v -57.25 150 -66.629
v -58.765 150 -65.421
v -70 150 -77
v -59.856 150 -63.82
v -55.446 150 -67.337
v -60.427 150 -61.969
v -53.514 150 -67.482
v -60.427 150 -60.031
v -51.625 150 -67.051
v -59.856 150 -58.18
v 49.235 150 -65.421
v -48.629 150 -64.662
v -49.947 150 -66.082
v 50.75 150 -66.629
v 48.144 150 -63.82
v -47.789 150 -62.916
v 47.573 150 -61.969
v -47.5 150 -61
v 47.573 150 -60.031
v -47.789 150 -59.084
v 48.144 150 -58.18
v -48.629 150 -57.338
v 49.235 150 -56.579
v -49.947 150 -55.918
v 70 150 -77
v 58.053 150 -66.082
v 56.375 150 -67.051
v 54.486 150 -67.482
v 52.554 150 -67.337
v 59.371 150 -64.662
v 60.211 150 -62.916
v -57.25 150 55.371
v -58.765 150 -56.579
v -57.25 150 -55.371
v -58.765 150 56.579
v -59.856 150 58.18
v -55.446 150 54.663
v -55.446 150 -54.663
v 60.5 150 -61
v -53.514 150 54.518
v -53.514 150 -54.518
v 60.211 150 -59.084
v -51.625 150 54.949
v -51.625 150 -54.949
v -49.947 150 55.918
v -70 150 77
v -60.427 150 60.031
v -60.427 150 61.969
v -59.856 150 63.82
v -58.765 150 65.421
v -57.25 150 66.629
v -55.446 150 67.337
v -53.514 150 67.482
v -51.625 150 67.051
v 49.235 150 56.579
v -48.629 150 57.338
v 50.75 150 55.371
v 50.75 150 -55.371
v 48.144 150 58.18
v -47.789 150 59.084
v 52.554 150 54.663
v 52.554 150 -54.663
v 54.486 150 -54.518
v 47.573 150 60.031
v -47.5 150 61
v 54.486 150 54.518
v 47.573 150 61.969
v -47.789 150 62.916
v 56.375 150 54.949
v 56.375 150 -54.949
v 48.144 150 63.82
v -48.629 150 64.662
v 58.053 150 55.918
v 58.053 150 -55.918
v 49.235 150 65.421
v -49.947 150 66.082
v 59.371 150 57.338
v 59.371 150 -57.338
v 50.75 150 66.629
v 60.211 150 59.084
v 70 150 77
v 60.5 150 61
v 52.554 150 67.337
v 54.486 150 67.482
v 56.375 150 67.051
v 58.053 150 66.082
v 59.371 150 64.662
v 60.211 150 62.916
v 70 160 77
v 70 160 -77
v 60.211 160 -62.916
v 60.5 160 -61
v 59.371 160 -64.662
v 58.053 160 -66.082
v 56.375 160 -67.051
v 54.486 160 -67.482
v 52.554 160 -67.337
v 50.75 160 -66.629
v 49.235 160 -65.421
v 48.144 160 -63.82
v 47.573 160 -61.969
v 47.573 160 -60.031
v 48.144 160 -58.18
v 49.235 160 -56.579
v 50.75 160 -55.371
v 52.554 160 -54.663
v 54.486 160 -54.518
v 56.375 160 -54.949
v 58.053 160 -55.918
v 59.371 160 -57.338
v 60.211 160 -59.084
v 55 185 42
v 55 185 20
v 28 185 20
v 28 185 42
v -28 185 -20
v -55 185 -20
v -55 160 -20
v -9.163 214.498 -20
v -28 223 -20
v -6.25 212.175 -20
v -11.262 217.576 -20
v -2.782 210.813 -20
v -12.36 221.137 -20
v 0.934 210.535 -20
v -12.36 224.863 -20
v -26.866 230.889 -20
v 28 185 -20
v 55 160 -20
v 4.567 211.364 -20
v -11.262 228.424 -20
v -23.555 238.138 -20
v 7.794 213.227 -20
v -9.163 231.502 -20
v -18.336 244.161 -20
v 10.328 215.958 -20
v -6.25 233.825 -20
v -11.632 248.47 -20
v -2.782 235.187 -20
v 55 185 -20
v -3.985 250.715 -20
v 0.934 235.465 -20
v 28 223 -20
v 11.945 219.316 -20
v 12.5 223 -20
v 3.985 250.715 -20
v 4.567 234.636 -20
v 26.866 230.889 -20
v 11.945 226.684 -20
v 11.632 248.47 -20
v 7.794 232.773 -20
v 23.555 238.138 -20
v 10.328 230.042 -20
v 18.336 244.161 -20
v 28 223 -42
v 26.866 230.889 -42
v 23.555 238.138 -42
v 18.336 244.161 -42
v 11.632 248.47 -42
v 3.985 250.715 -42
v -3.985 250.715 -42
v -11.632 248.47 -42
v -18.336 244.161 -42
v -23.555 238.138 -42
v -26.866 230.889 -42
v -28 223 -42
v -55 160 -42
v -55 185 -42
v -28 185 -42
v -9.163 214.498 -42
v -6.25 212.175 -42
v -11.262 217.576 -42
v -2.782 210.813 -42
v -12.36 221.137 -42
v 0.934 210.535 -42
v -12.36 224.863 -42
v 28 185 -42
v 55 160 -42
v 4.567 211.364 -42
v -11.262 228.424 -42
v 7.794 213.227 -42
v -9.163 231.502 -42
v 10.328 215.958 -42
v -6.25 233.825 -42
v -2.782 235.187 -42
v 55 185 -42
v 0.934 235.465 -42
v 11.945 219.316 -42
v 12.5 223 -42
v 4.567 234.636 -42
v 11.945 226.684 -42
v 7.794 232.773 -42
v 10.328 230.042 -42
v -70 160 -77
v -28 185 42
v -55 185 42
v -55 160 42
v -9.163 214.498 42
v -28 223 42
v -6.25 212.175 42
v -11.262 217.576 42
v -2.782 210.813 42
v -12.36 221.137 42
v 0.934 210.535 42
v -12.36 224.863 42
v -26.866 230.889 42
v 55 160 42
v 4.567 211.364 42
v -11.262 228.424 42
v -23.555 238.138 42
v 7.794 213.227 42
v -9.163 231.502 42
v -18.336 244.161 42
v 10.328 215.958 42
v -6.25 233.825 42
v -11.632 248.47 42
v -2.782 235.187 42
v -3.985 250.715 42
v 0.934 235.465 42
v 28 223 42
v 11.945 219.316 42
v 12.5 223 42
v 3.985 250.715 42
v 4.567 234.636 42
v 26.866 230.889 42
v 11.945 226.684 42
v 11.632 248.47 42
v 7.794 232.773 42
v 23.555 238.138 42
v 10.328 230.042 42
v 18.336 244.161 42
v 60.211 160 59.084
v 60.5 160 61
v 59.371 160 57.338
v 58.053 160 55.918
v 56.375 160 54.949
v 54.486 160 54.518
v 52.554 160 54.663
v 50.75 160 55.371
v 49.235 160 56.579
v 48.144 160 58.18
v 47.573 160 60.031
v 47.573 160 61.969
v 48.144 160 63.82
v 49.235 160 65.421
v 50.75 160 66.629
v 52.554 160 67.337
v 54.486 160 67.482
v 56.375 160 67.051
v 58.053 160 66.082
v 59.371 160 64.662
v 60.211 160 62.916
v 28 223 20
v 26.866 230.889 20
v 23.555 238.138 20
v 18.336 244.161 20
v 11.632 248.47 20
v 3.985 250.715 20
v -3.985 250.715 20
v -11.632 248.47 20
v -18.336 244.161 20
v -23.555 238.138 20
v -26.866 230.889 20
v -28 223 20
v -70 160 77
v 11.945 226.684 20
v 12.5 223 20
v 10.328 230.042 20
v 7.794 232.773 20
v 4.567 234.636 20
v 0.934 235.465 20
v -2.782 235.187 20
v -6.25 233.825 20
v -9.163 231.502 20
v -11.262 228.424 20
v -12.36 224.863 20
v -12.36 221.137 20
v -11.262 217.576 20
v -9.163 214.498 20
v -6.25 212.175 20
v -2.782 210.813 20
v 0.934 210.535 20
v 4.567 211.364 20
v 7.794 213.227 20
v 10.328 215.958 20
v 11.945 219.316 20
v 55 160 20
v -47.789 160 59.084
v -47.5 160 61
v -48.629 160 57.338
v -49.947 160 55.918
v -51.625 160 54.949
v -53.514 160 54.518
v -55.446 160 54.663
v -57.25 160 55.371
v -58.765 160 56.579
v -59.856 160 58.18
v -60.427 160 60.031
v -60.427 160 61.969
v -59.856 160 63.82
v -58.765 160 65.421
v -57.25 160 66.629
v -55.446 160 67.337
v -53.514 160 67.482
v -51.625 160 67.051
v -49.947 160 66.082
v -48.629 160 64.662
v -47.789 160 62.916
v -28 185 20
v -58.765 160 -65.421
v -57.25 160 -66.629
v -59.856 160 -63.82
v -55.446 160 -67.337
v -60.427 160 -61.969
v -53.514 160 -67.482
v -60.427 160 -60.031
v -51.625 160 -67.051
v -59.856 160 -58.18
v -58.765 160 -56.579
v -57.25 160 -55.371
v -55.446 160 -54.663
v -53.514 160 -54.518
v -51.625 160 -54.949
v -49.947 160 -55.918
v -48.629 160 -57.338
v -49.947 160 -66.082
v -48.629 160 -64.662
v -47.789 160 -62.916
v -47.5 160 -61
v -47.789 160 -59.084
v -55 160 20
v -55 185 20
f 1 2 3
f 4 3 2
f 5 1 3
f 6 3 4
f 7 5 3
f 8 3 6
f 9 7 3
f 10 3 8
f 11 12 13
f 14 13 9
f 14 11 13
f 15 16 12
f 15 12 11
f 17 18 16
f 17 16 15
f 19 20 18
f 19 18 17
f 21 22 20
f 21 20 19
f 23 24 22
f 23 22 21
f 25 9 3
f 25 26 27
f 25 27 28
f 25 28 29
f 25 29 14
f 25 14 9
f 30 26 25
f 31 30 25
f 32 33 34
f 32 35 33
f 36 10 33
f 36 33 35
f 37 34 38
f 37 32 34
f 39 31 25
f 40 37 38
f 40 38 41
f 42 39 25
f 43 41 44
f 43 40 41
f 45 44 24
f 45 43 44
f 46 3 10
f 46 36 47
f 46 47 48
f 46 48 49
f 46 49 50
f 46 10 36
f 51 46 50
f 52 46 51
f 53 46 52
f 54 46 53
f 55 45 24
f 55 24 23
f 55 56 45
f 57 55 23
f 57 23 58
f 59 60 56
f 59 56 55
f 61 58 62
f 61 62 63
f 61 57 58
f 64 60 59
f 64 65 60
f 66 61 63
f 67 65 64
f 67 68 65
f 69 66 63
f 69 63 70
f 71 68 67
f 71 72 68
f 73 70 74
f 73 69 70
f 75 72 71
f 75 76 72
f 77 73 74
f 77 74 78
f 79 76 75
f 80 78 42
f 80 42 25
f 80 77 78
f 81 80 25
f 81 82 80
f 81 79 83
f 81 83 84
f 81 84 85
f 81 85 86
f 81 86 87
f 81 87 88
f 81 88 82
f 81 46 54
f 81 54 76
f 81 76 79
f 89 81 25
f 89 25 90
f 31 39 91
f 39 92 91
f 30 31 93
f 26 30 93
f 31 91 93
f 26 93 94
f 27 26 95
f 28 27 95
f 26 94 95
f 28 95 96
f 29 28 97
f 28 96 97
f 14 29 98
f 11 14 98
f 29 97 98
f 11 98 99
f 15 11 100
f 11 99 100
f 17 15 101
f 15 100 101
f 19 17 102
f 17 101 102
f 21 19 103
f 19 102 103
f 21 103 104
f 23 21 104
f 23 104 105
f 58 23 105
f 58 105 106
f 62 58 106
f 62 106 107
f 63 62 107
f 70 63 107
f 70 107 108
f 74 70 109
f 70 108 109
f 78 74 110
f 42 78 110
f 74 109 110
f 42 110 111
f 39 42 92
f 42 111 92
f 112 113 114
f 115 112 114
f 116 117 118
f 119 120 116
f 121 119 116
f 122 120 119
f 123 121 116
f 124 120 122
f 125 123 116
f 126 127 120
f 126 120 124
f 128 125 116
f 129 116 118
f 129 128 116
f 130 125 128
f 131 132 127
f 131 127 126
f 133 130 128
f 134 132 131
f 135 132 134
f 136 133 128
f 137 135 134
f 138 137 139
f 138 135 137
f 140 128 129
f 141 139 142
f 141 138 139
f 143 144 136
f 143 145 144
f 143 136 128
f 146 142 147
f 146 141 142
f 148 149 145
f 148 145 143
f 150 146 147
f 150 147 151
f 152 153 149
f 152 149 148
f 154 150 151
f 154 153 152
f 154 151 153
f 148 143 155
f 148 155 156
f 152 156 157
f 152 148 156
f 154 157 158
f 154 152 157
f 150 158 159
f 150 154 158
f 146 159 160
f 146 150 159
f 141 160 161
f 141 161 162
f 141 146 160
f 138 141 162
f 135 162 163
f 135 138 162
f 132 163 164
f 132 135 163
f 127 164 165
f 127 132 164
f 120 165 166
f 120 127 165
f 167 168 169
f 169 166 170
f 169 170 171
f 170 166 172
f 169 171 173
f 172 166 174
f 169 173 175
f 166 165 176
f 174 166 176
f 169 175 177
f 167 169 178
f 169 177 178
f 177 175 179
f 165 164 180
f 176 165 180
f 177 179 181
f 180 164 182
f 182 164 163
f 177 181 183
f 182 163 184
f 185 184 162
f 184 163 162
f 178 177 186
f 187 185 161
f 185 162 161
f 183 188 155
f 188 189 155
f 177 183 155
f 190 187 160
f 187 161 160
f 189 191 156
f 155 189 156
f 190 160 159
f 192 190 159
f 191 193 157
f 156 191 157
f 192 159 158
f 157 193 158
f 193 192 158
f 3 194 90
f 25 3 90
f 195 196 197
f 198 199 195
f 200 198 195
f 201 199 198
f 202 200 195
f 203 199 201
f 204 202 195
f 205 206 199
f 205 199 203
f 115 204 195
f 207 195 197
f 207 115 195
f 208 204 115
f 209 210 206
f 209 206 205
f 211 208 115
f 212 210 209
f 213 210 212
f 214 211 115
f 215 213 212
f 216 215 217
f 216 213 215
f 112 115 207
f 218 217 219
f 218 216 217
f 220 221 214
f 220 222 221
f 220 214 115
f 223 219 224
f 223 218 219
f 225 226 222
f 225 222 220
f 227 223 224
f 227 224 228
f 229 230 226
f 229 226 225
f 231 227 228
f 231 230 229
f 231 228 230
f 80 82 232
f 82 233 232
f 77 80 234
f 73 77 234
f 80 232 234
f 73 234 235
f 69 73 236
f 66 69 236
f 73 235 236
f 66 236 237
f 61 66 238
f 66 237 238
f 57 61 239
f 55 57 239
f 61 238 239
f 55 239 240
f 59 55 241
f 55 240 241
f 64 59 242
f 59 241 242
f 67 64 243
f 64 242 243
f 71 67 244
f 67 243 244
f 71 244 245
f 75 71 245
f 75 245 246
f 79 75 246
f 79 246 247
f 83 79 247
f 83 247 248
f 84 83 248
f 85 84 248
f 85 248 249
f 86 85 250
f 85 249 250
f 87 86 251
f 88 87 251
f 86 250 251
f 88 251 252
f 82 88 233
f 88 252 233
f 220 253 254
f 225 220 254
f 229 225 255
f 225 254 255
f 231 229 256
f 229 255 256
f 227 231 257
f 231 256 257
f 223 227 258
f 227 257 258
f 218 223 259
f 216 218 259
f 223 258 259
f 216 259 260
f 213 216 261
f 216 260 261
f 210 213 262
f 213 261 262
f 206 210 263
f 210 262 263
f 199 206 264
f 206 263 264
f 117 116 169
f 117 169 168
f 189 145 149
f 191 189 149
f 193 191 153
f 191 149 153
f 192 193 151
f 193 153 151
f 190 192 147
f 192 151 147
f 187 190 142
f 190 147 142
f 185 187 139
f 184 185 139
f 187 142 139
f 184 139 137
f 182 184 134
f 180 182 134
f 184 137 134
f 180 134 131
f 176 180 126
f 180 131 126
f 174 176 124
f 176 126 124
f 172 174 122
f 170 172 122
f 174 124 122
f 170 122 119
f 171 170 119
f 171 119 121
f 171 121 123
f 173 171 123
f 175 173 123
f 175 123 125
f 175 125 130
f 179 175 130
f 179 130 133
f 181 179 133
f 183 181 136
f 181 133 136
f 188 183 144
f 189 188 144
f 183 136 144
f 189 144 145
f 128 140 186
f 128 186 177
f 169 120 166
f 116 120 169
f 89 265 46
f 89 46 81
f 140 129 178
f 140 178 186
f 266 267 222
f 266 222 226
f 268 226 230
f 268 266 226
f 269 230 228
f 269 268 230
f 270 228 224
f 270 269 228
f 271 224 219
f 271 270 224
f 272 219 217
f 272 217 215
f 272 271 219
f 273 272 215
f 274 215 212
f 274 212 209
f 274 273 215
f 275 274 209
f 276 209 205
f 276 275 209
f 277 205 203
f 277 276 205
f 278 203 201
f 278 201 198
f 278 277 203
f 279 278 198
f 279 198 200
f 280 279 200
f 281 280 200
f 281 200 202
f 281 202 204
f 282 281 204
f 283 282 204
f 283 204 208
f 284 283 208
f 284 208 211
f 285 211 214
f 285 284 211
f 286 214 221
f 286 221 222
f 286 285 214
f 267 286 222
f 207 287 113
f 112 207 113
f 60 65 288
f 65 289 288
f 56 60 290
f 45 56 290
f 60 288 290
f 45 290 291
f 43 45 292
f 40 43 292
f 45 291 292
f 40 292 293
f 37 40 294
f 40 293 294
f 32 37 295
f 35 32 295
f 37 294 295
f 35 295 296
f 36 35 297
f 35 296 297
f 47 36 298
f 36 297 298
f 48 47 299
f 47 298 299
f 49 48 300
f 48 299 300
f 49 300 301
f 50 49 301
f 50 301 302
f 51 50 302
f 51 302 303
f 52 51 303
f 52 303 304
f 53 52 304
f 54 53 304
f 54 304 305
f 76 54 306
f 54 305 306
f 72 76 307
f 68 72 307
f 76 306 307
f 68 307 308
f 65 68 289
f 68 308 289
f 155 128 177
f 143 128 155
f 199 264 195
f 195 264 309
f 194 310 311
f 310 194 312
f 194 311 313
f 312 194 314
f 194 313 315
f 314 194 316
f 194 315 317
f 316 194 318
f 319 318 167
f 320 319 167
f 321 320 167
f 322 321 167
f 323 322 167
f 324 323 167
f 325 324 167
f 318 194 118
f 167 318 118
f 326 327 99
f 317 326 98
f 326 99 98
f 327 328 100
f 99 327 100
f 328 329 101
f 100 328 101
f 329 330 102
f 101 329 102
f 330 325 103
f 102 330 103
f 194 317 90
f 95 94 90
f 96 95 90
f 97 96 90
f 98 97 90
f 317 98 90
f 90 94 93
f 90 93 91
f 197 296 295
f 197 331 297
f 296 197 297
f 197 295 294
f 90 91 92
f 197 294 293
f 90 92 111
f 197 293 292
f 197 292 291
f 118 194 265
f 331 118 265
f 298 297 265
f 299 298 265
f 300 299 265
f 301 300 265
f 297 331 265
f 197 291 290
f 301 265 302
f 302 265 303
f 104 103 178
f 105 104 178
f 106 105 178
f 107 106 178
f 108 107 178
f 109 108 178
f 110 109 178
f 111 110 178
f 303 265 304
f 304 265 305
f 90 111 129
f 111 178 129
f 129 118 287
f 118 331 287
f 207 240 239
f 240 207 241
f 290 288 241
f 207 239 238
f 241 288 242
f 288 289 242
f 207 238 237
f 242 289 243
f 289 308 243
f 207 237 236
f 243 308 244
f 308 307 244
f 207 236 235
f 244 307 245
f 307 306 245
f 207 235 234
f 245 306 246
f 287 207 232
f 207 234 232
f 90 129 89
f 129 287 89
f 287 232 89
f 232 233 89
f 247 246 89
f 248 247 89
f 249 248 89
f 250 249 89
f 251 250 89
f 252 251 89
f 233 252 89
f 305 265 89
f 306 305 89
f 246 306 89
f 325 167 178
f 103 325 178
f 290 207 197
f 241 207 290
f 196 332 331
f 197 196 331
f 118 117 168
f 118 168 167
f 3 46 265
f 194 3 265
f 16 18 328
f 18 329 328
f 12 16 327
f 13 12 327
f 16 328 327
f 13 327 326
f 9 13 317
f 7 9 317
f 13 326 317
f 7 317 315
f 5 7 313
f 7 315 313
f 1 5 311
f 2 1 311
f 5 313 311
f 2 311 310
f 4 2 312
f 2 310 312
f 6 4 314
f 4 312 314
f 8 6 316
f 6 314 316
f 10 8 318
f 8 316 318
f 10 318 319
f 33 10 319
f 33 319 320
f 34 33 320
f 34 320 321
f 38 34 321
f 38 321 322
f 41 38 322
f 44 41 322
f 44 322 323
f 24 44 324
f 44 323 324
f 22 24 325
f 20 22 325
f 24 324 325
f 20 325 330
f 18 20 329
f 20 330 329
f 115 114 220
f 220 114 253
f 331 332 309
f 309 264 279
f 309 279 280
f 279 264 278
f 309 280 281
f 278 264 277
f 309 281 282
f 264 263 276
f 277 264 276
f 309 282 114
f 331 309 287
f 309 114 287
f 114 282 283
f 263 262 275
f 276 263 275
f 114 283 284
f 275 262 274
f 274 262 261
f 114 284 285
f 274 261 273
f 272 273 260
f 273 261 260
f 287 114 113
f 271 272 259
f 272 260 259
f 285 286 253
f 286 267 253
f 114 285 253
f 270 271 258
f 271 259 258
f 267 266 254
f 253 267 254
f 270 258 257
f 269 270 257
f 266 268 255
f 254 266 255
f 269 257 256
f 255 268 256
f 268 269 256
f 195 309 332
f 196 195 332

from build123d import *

# Parameters (mm, degrees)
SKETCH8_W                       = 140
SKETCH8_H                       = 10
BOSS_EXTRUDE6_DEPTH             = 77
BOSS_EXTRUDE6_2_DEPTH           = 77
SKETCH9_R                       = 6.5
CUT_EXTRUDE3_POS_1_2_DEPTH      = 160
CUT_EXTRUDE3_POS_1_2_DEPTH_BACK = 160
SKETCH3_R                       = 12.5
BOSS_EXTRUDE2_POS_1_2_DEPTH     = 22
SKETCH16_W                      = 251.646803711
SKETCH16_H                      = 83.728976974
CUT_EXTRUDE4_DEPTH              = 58
CUT_EXTRUDE4_DEPTH_BACK         = 98


with BuildPart() as part:
    # Sketch8 → Boss-Extrude6 (new body, symmetric)
    with BuildSketch(Plane.XY):
        with Locations((0, 155)):
            Rectangle(SKETCH8_W, SKETCH8_H)
    extrude(amount=BOSS_EXTRUDE6_DEPTH, both=True)


with BuildPart() as body_2:
    # Sketch8 → Boss-Extrude6 2 (new body, symmetric)
    with BuildSketch(Plane.XY):
        with Locations((0, -5)):
            Rectangle(SKETCH8_W, SKETCH8_H)
    extrude(amount=BOSS_EXTRUDE6_2_DEPTH, both=True)


with BuildPart() as cut_extrude3_pos_1_2_tool:
    # Sketch9 → Cut-Extrude3 _pos 1_2 (new body, two sides)
    with BuildSketch(Plane(origin=(0, 0, 0), x_dir=(1, 0, 0), z_dir=(0, 1, 0))) as cut_extrude3_pos_1_2_sk:
        with Locations((54, 61)):
            Circle(SKETCH9_R)
        with Locations((-54, 61)):
            Circle(SKETCH9_R)
        with Locations((-54, -61)):
            Circle(SKETCH9_R)
        with Locations((54, -61)):
            Circle(SKETCH9_R)
    extrude(amount=CUT_EXTRUDE3_POS_1_2_DEPTH)
    extrude(cut_extrude3_pos_1_2_sk.sketch, amount=-CUT_EXTRUDE3_POS_1_2_DEPTH_BACK)


with BuildPart() as part_1:
    add(part.part)

    # Cut-Extrude3 _pos 1_2: cut by cut_extrude3_pos_1_2_tool
    add(cut_extrude3_pos_1_2_tool.part, mode=Mode.SUBTRACT)

    # Sketch3 → Boss-Extrude2 _pos 1_2 (add)
    with BuildSketch(Plane.XY.offset(20)):
        with BuildLine():
            Line((55, 160), (55, 185))
            Line((55, 185), (28, 185))
            Line((28, 185), (28, 223))
            ThreePointArc((28, 223), (0, 251), (-28, 223))
            Line((-28, 223), (-28, 185))
            Line((-28, 185), (-55, 185))
            Line((-55, 185), (-55, 160))
            Line((-55, 160), (55, 160))
        make_face()
        with Locations((0, 223)):
            Circle(SKETCH3_R, mode=Mode.SUBTRACT)
    boss_extrude2_pos_1_2 = extrude(amount=BOSS_EXTRUDE2_POS_1_2_DEPTH)

    # Mirror4: Boss-Extrude2 _pos 1_2 across plane
    add(boss_extrude2_pos_1_2.mirror(Plane.XY))


with BuildPart() as body_2_1:
    add(body_2.part)

    # Cut-Extrude3 _pos 1_2: cut by cut_extrude3_pos_1_2_tool
    add(cut_extrude3_pos_1_2_tool.part, mode=Mode.SUBTRACT)

    # Sketch16 → Cut-Extrude4 (cut, two sides)
    with BuildSketch(Plane.XY.offset(20)) as cut_extrude4_sk:
        with Locations((-3.761561591, 8.391166305)):
            Rectangle(SKETCH16_W, SKETCH16_H)
    extrude(amount=CUT_EXTRUDE4_DEPTH, mode=Mode.SUBTRACT)
    extrude(cut_extrude4_sk.sketch, amount=-CUT_EXTRUDE4_DEPTH_BACK, mode=Mode.SUBTRACT)


solid = part_1.part
